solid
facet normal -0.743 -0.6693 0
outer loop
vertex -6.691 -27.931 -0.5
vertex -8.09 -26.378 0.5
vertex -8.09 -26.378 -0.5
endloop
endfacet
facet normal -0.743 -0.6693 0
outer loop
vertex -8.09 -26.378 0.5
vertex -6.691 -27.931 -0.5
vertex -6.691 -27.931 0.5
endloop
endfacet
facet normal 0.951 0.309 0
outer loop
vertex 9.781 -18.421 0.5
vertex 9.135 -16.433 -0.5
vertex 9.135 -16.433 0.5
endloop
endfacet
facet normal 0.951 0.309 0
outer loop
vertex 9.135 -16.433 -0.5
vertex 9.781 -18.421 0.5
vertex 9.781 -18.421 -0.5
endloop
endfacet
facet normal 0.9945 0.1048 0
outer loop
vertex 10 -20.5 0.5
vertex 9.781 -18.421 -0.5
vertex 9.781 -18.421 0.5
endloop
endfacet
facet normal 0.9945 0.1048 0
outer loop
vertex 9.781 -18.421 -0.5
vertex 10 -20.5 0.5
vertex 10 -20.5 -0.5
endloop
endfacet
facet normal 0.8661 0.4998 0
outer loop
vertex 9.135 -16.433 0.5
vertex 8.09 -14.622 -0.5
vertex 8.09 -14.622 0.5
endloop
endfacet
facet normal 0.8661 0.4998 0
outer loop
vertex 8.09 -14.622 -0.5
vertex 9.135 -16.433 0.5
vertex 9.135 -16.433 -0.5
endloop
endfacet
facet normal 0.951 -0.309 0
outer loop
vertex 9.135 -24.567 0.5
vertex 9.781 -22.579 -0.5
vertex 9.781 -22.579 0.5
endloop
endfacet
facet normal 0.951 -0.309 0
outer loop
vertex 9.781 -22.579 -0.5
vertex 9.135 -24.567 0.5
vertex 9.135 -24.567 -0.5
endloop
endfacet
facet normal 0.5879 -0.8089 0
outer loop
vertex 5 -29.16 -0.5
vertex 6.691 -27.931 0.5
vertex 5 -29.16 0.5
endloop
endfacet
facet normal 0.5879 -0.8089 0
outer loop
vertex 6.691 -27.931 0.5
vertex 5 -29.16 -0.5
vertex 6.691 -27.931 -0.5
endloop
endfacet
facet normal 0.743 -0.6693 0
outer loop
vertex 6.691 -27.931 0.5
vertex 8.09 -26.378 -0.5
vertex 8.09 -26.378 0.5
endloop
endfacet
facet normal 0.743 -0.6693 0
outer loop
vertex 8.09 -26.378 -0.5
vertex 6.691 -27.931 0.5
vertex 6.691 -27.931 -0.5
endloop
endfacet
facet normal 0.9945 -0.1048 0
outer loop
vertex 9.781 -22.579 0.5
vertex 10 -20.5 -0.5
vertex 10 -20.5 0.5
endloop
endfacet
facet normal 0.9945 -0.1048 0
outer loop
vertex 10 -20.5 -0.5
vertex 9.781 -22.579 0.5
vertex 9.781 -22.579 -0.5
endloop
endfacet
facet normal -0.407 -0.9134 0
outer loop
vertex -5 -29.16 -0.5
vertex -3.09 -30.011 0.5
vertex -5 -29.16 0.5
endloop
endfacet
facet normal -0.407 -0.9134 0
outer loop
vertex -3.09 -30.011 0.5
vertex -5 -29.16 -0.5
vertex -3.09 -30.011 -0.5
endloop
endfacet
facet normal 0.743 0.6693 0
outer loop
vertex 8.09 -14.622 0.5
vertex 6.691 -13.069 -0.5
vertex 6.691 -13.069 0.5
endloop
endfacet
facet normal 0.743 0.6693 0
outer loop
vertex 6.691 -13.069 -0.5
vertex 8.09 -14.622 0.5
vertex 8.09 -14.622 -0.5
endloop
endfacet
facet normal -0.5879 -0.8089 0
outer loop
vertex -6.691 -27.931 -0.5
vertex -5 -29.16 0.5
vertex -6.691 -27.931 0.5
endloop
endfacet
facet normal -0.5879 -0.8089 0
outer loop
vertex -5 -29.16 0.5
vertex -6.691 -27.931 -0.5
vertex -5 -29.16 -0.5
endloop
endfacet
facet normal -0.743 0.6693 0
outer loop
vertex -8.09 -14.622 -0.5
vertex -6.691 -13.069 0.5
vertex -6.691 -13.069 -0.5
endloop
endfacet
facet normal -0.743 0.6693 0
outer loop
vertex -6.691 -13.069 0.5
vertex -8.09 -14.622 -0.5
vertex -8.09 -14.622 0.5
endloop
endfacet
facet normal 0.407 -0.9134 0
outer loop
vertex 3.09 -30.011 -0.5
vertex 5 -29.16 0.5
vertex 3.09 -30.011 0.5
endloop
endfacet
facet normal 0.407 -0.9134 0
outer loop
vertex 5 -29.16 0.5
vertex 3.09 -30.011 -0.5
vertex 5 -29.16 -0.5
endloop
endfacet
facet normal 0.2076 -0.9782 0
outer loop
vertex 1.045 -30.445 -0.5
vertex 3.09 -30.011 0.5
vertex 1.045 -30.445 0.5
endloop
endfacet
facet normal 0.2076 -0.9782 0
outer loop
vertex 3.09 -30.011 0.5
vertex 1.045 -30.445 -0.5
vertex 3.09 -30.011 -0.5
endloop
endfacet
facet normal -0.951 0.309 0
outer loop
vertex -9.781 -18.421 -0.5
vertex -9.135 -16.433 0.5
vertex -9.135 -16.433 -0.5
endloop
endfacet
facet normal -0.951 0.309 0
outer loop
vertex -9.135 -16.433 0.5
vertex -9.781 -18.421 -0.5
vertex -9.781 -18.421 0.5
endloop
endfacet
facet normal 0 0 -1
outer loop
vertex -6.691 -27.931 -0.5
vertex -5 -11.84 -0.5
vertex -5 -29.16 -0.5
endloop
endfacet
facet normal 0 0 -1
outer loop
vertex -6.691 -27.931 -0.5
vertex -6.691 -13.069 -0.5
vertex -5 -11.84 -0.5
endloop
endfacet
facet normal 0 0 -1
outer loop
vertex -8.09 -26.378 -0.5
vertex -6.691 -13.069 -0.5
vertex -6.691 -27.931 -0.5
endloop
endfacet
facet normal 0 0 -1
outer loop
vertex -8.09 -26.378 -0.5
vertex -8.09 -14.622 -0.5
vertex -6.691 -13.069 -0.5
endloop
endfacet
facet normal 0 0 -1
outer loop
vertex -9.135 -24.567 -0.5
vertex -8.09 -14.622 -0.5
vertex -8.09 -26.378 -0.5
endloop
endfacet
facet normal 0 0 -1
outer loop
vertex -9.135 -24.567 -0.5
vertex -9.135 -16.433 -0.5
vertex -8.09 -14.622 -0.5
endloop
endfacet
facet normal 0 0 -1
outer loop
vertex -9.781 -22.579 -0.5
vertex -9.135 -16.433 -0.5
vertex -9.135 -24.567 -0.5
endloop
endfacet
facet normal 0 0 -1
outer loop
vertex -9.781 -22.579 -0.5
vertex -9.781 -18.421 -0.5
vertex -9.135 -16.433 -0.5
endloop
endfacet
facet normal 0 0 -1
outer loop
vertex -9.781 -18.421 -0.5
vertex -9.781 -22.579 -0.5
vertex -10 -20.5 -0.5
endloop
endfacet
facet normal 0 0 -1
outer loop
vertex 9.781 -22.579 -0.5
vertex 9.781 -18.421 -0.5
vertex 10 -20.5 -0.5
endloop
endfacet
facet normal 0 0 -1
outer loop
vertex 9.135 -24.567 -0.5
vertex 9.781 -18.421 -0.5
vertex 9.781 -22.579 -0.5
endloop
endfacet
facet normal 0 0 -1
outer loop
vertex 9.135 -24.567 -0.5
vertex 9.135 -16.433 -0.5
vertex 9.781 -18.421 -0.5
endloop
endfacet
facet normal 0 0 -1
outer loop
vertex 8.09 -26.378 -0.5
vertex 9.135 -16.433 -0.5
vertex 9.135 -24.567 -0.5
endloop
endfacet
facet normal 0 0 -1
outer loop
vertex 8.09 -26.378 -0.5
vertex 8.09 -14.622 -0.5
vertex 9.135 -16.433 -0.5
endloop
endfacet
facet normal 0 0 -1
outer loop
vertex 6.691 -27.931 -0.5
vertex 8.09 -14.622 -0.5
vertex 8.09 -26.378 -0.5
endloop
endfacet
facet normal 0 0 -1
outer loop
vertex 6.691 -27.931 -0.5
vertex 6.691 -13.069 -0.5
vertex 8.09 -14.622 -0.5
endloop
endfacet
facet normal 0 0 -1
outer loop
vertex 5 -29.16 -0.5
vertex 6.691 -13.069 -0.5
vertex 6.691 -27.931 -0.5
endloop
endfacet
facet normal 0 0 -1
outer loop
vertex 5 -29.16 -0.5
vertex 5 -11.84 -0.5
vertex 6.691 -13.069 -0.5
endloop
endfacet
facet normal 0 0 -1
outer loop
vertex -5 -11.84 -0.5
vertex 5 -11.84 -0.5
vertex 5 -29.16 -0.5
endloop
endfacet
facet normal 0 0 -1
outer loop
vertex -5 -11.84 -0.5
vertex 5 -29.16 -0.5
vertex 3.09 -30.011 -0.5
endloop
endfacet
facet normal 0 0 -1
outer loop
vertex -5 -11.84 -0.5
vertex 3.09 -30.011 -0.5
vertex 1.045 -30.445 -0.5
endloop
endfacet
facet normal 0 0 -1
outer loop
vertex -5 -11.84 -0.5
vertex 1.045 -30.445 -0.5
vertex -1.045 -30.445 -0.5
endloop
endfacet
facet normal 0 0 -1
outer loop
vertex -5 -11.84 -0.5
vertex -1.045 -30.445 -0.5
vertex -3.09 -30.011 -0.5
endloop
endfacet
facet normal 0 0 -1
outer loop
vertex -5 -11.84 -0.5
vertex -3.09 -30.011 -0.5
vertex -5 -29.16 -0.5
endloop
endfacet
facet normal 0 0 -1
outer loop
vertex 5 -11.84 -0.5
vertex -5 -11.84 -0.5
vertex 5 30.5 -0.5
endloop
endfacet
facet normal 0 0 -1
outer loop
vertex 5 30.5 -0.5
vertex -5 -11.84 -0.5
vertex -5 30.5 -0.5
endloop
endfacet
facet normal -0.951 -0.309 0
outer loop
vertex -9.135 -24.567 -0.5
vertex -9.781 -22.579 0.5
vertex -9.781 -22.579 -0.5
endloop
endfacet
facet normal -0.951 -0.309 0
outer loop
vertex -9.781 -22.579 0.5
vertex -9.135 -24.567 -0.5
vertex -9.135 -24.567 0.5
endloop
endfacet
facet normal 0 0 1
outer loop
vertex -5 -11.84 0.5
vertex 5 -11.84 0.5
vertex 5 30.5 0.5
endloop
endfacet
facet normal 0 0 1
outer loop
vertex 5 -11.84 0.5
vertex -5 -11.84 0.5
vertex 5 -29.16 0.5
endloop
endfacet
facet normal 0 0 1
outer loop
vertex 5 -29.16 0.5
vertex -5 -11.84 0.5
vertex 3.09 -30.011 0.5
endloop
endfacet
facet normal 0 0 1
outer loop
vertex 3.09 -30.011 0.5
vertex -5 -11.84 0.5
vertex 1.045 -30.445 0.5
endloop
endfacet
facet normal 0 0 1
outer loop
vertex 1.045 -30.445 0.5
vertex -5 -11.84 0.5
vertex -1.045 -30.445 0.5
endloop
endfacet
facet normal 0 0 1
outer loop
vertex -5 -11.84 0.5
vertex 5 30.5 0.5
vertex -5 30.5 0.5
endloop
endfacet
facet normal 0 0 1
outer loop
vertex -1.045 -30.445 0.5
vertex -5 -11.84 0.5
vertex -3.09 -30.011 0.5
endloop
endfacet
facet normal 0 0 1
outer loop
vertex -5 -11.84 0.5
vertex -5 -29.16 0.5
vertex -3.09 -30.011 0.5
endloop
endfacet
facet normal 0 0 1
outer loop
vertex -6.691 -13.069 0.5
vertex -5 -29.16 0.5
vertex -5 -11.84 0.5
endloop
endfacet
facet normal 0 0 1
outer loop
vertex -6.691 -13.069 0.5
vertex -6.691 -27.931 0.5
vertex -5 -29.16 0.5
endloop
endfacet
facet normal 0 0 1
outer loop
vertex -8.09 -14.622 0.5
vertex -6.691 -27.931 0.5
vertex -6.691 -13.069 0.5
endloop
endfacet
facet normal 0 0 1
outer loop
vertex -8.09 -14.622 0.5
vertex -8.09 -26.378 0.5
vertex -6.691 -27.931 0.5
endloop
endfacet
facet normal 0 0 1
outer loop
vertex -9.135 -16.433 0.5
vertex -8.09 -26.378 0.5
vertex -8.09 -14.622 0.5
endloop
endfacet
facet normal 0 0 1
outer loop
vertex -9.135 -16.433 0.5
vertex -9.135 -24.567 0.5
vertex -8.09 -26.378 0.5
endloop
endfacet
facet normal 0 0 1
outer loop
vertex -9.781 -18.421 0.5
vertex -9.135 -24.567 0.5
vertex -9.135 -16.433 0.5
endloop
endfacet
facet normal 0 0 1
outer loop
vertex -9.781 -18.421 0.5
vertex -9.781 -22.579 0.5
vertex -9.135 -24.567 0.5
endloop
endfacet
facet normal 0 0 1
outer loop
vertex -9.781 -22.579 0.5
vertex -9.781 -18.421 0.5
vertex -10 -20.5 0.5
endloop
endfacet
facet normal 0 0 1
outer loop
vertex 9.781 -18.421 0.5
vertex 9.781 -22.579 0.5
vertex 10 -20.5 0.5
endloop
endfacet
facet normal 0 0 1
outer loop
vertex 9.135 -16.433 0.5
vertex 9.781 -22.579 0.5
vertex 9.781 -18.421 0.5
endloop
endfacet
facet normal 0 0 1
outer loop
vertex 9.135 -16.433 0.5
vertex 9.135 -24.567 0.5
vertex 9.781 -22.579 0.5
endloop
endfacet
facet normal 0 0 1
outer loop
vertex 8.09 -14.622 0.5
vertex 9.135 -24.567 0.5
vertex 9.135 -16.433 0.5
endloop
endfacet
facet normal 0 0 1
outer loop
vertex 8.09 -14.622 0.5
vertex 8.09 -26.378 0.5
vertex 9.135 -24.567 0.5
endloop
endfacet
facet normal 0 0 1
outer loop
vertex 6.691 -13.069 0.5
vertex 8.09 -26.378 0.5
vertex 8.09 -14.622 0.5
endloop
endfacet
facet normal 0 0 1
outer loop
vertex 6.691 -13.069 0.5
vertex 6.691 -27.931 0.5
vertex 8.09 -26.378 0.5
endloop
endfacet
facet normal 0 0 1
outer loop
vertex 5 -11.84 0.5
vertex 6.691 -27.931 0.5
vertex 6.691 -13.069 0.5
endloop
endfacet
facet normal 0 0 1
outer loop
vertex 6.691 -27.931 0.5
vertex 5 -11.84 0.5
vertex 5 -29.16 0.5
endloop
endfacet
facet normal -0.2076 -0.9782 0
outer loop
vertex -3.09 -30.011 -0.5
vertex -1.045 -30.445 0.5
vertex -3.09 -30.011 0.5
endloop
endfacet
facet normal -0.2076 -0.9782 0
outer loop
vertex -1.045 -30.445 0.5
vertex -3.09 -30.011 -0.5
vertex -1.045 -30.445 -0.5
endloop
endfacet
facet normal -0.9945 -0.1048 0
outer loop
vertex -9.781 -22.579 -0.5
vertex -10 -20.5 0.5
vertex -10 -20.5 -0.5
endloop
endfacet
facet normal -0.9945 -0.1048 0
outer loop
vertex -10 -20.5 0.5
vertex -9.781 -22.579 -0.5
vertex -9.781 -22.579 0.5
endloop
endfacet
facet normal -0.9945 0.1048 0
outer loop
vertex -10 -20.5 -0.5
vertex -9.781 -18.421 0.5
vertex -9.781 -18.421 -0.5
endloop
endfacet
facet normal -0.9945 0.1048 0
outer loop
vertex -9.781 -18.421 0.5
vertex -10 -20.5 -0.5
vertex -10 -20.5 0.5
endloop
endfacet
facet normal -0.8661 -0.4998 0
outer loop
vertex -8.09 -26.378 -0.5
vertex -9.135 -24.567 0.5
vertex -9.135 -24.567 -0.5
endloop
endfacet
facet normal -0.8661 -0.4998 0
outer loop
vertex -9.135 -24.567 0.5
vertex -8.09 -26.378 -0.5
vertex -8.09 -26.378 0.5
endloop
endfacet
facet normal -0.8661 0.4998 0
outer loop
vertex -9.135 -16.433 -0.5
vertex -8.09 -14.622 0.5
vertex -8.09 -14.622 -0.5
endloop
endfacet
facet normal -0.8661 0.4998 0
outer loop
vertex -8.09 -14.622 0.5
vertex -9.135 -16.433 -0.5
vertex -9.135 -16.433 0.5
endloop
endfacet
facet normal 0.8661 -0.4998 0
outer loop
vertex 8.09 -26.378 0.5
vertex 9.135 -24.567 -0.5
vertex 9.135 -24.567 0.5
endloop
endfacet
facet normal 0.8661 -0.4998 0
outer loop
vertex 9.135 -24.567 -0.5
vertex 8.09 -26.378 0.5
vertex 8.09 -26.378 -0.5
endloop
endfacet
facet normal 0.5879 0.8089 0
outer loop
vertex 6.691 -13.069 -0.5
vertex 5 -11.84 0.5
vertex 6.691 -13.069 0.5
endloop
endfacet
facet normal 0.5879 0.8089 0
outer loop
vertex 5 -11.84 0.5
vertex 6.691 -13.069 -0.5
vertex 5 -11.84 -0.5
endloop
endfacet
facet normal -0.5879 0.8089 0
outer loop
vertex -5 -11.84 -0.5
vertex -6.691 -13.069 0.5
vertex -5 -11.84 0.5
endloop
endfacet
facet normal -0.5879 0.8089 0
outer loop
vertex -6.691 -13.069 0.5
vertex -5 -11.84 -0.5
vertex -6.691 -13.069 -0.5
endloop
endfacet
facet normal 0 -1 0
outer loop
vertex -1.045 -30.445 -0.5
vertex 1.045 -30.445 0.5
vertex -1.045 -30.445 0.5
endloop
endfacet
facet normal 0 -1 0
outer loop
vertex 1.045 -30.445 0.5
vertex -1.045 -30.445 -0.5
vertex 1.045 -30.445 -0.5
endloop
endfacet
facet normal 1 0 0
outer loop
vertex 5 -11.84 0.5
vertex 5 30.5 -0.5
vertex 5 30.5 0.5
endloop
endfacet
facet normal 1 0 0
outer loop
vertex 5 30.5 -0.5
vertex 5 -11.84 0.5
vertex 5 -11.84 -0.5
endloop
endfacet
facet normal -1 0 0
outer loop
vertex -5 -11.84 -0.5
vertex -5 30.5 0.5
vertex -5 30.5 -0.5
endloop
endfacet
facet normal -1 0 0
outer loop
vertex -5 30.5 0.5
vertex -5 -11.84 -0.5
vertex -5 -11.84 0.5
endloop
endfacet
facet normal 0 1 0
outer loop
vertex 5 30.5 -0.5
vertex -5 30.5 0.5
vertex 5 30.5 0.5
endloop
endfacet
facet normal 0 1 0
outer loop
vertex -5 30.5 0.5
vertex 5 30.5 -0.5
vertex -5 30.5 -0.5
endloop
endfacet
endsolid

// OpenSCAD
module FSR(fsrDiameter=20, fsrThickness=1, fsrNeckWidth=10, fsrLength=61)
{
	translate([0,-fsrLength/2+fsrDiameter/2,0])
	{
		cylinder(r=fsrDiameter/2, h=fsrThickness, center=true);
	}

	translate([0,fsrDiameter/4,0])
	cube([fsrNeckWidth,fsrLength-fsrDiameter/2,fsrThickness], center=true);
}


FSR();
